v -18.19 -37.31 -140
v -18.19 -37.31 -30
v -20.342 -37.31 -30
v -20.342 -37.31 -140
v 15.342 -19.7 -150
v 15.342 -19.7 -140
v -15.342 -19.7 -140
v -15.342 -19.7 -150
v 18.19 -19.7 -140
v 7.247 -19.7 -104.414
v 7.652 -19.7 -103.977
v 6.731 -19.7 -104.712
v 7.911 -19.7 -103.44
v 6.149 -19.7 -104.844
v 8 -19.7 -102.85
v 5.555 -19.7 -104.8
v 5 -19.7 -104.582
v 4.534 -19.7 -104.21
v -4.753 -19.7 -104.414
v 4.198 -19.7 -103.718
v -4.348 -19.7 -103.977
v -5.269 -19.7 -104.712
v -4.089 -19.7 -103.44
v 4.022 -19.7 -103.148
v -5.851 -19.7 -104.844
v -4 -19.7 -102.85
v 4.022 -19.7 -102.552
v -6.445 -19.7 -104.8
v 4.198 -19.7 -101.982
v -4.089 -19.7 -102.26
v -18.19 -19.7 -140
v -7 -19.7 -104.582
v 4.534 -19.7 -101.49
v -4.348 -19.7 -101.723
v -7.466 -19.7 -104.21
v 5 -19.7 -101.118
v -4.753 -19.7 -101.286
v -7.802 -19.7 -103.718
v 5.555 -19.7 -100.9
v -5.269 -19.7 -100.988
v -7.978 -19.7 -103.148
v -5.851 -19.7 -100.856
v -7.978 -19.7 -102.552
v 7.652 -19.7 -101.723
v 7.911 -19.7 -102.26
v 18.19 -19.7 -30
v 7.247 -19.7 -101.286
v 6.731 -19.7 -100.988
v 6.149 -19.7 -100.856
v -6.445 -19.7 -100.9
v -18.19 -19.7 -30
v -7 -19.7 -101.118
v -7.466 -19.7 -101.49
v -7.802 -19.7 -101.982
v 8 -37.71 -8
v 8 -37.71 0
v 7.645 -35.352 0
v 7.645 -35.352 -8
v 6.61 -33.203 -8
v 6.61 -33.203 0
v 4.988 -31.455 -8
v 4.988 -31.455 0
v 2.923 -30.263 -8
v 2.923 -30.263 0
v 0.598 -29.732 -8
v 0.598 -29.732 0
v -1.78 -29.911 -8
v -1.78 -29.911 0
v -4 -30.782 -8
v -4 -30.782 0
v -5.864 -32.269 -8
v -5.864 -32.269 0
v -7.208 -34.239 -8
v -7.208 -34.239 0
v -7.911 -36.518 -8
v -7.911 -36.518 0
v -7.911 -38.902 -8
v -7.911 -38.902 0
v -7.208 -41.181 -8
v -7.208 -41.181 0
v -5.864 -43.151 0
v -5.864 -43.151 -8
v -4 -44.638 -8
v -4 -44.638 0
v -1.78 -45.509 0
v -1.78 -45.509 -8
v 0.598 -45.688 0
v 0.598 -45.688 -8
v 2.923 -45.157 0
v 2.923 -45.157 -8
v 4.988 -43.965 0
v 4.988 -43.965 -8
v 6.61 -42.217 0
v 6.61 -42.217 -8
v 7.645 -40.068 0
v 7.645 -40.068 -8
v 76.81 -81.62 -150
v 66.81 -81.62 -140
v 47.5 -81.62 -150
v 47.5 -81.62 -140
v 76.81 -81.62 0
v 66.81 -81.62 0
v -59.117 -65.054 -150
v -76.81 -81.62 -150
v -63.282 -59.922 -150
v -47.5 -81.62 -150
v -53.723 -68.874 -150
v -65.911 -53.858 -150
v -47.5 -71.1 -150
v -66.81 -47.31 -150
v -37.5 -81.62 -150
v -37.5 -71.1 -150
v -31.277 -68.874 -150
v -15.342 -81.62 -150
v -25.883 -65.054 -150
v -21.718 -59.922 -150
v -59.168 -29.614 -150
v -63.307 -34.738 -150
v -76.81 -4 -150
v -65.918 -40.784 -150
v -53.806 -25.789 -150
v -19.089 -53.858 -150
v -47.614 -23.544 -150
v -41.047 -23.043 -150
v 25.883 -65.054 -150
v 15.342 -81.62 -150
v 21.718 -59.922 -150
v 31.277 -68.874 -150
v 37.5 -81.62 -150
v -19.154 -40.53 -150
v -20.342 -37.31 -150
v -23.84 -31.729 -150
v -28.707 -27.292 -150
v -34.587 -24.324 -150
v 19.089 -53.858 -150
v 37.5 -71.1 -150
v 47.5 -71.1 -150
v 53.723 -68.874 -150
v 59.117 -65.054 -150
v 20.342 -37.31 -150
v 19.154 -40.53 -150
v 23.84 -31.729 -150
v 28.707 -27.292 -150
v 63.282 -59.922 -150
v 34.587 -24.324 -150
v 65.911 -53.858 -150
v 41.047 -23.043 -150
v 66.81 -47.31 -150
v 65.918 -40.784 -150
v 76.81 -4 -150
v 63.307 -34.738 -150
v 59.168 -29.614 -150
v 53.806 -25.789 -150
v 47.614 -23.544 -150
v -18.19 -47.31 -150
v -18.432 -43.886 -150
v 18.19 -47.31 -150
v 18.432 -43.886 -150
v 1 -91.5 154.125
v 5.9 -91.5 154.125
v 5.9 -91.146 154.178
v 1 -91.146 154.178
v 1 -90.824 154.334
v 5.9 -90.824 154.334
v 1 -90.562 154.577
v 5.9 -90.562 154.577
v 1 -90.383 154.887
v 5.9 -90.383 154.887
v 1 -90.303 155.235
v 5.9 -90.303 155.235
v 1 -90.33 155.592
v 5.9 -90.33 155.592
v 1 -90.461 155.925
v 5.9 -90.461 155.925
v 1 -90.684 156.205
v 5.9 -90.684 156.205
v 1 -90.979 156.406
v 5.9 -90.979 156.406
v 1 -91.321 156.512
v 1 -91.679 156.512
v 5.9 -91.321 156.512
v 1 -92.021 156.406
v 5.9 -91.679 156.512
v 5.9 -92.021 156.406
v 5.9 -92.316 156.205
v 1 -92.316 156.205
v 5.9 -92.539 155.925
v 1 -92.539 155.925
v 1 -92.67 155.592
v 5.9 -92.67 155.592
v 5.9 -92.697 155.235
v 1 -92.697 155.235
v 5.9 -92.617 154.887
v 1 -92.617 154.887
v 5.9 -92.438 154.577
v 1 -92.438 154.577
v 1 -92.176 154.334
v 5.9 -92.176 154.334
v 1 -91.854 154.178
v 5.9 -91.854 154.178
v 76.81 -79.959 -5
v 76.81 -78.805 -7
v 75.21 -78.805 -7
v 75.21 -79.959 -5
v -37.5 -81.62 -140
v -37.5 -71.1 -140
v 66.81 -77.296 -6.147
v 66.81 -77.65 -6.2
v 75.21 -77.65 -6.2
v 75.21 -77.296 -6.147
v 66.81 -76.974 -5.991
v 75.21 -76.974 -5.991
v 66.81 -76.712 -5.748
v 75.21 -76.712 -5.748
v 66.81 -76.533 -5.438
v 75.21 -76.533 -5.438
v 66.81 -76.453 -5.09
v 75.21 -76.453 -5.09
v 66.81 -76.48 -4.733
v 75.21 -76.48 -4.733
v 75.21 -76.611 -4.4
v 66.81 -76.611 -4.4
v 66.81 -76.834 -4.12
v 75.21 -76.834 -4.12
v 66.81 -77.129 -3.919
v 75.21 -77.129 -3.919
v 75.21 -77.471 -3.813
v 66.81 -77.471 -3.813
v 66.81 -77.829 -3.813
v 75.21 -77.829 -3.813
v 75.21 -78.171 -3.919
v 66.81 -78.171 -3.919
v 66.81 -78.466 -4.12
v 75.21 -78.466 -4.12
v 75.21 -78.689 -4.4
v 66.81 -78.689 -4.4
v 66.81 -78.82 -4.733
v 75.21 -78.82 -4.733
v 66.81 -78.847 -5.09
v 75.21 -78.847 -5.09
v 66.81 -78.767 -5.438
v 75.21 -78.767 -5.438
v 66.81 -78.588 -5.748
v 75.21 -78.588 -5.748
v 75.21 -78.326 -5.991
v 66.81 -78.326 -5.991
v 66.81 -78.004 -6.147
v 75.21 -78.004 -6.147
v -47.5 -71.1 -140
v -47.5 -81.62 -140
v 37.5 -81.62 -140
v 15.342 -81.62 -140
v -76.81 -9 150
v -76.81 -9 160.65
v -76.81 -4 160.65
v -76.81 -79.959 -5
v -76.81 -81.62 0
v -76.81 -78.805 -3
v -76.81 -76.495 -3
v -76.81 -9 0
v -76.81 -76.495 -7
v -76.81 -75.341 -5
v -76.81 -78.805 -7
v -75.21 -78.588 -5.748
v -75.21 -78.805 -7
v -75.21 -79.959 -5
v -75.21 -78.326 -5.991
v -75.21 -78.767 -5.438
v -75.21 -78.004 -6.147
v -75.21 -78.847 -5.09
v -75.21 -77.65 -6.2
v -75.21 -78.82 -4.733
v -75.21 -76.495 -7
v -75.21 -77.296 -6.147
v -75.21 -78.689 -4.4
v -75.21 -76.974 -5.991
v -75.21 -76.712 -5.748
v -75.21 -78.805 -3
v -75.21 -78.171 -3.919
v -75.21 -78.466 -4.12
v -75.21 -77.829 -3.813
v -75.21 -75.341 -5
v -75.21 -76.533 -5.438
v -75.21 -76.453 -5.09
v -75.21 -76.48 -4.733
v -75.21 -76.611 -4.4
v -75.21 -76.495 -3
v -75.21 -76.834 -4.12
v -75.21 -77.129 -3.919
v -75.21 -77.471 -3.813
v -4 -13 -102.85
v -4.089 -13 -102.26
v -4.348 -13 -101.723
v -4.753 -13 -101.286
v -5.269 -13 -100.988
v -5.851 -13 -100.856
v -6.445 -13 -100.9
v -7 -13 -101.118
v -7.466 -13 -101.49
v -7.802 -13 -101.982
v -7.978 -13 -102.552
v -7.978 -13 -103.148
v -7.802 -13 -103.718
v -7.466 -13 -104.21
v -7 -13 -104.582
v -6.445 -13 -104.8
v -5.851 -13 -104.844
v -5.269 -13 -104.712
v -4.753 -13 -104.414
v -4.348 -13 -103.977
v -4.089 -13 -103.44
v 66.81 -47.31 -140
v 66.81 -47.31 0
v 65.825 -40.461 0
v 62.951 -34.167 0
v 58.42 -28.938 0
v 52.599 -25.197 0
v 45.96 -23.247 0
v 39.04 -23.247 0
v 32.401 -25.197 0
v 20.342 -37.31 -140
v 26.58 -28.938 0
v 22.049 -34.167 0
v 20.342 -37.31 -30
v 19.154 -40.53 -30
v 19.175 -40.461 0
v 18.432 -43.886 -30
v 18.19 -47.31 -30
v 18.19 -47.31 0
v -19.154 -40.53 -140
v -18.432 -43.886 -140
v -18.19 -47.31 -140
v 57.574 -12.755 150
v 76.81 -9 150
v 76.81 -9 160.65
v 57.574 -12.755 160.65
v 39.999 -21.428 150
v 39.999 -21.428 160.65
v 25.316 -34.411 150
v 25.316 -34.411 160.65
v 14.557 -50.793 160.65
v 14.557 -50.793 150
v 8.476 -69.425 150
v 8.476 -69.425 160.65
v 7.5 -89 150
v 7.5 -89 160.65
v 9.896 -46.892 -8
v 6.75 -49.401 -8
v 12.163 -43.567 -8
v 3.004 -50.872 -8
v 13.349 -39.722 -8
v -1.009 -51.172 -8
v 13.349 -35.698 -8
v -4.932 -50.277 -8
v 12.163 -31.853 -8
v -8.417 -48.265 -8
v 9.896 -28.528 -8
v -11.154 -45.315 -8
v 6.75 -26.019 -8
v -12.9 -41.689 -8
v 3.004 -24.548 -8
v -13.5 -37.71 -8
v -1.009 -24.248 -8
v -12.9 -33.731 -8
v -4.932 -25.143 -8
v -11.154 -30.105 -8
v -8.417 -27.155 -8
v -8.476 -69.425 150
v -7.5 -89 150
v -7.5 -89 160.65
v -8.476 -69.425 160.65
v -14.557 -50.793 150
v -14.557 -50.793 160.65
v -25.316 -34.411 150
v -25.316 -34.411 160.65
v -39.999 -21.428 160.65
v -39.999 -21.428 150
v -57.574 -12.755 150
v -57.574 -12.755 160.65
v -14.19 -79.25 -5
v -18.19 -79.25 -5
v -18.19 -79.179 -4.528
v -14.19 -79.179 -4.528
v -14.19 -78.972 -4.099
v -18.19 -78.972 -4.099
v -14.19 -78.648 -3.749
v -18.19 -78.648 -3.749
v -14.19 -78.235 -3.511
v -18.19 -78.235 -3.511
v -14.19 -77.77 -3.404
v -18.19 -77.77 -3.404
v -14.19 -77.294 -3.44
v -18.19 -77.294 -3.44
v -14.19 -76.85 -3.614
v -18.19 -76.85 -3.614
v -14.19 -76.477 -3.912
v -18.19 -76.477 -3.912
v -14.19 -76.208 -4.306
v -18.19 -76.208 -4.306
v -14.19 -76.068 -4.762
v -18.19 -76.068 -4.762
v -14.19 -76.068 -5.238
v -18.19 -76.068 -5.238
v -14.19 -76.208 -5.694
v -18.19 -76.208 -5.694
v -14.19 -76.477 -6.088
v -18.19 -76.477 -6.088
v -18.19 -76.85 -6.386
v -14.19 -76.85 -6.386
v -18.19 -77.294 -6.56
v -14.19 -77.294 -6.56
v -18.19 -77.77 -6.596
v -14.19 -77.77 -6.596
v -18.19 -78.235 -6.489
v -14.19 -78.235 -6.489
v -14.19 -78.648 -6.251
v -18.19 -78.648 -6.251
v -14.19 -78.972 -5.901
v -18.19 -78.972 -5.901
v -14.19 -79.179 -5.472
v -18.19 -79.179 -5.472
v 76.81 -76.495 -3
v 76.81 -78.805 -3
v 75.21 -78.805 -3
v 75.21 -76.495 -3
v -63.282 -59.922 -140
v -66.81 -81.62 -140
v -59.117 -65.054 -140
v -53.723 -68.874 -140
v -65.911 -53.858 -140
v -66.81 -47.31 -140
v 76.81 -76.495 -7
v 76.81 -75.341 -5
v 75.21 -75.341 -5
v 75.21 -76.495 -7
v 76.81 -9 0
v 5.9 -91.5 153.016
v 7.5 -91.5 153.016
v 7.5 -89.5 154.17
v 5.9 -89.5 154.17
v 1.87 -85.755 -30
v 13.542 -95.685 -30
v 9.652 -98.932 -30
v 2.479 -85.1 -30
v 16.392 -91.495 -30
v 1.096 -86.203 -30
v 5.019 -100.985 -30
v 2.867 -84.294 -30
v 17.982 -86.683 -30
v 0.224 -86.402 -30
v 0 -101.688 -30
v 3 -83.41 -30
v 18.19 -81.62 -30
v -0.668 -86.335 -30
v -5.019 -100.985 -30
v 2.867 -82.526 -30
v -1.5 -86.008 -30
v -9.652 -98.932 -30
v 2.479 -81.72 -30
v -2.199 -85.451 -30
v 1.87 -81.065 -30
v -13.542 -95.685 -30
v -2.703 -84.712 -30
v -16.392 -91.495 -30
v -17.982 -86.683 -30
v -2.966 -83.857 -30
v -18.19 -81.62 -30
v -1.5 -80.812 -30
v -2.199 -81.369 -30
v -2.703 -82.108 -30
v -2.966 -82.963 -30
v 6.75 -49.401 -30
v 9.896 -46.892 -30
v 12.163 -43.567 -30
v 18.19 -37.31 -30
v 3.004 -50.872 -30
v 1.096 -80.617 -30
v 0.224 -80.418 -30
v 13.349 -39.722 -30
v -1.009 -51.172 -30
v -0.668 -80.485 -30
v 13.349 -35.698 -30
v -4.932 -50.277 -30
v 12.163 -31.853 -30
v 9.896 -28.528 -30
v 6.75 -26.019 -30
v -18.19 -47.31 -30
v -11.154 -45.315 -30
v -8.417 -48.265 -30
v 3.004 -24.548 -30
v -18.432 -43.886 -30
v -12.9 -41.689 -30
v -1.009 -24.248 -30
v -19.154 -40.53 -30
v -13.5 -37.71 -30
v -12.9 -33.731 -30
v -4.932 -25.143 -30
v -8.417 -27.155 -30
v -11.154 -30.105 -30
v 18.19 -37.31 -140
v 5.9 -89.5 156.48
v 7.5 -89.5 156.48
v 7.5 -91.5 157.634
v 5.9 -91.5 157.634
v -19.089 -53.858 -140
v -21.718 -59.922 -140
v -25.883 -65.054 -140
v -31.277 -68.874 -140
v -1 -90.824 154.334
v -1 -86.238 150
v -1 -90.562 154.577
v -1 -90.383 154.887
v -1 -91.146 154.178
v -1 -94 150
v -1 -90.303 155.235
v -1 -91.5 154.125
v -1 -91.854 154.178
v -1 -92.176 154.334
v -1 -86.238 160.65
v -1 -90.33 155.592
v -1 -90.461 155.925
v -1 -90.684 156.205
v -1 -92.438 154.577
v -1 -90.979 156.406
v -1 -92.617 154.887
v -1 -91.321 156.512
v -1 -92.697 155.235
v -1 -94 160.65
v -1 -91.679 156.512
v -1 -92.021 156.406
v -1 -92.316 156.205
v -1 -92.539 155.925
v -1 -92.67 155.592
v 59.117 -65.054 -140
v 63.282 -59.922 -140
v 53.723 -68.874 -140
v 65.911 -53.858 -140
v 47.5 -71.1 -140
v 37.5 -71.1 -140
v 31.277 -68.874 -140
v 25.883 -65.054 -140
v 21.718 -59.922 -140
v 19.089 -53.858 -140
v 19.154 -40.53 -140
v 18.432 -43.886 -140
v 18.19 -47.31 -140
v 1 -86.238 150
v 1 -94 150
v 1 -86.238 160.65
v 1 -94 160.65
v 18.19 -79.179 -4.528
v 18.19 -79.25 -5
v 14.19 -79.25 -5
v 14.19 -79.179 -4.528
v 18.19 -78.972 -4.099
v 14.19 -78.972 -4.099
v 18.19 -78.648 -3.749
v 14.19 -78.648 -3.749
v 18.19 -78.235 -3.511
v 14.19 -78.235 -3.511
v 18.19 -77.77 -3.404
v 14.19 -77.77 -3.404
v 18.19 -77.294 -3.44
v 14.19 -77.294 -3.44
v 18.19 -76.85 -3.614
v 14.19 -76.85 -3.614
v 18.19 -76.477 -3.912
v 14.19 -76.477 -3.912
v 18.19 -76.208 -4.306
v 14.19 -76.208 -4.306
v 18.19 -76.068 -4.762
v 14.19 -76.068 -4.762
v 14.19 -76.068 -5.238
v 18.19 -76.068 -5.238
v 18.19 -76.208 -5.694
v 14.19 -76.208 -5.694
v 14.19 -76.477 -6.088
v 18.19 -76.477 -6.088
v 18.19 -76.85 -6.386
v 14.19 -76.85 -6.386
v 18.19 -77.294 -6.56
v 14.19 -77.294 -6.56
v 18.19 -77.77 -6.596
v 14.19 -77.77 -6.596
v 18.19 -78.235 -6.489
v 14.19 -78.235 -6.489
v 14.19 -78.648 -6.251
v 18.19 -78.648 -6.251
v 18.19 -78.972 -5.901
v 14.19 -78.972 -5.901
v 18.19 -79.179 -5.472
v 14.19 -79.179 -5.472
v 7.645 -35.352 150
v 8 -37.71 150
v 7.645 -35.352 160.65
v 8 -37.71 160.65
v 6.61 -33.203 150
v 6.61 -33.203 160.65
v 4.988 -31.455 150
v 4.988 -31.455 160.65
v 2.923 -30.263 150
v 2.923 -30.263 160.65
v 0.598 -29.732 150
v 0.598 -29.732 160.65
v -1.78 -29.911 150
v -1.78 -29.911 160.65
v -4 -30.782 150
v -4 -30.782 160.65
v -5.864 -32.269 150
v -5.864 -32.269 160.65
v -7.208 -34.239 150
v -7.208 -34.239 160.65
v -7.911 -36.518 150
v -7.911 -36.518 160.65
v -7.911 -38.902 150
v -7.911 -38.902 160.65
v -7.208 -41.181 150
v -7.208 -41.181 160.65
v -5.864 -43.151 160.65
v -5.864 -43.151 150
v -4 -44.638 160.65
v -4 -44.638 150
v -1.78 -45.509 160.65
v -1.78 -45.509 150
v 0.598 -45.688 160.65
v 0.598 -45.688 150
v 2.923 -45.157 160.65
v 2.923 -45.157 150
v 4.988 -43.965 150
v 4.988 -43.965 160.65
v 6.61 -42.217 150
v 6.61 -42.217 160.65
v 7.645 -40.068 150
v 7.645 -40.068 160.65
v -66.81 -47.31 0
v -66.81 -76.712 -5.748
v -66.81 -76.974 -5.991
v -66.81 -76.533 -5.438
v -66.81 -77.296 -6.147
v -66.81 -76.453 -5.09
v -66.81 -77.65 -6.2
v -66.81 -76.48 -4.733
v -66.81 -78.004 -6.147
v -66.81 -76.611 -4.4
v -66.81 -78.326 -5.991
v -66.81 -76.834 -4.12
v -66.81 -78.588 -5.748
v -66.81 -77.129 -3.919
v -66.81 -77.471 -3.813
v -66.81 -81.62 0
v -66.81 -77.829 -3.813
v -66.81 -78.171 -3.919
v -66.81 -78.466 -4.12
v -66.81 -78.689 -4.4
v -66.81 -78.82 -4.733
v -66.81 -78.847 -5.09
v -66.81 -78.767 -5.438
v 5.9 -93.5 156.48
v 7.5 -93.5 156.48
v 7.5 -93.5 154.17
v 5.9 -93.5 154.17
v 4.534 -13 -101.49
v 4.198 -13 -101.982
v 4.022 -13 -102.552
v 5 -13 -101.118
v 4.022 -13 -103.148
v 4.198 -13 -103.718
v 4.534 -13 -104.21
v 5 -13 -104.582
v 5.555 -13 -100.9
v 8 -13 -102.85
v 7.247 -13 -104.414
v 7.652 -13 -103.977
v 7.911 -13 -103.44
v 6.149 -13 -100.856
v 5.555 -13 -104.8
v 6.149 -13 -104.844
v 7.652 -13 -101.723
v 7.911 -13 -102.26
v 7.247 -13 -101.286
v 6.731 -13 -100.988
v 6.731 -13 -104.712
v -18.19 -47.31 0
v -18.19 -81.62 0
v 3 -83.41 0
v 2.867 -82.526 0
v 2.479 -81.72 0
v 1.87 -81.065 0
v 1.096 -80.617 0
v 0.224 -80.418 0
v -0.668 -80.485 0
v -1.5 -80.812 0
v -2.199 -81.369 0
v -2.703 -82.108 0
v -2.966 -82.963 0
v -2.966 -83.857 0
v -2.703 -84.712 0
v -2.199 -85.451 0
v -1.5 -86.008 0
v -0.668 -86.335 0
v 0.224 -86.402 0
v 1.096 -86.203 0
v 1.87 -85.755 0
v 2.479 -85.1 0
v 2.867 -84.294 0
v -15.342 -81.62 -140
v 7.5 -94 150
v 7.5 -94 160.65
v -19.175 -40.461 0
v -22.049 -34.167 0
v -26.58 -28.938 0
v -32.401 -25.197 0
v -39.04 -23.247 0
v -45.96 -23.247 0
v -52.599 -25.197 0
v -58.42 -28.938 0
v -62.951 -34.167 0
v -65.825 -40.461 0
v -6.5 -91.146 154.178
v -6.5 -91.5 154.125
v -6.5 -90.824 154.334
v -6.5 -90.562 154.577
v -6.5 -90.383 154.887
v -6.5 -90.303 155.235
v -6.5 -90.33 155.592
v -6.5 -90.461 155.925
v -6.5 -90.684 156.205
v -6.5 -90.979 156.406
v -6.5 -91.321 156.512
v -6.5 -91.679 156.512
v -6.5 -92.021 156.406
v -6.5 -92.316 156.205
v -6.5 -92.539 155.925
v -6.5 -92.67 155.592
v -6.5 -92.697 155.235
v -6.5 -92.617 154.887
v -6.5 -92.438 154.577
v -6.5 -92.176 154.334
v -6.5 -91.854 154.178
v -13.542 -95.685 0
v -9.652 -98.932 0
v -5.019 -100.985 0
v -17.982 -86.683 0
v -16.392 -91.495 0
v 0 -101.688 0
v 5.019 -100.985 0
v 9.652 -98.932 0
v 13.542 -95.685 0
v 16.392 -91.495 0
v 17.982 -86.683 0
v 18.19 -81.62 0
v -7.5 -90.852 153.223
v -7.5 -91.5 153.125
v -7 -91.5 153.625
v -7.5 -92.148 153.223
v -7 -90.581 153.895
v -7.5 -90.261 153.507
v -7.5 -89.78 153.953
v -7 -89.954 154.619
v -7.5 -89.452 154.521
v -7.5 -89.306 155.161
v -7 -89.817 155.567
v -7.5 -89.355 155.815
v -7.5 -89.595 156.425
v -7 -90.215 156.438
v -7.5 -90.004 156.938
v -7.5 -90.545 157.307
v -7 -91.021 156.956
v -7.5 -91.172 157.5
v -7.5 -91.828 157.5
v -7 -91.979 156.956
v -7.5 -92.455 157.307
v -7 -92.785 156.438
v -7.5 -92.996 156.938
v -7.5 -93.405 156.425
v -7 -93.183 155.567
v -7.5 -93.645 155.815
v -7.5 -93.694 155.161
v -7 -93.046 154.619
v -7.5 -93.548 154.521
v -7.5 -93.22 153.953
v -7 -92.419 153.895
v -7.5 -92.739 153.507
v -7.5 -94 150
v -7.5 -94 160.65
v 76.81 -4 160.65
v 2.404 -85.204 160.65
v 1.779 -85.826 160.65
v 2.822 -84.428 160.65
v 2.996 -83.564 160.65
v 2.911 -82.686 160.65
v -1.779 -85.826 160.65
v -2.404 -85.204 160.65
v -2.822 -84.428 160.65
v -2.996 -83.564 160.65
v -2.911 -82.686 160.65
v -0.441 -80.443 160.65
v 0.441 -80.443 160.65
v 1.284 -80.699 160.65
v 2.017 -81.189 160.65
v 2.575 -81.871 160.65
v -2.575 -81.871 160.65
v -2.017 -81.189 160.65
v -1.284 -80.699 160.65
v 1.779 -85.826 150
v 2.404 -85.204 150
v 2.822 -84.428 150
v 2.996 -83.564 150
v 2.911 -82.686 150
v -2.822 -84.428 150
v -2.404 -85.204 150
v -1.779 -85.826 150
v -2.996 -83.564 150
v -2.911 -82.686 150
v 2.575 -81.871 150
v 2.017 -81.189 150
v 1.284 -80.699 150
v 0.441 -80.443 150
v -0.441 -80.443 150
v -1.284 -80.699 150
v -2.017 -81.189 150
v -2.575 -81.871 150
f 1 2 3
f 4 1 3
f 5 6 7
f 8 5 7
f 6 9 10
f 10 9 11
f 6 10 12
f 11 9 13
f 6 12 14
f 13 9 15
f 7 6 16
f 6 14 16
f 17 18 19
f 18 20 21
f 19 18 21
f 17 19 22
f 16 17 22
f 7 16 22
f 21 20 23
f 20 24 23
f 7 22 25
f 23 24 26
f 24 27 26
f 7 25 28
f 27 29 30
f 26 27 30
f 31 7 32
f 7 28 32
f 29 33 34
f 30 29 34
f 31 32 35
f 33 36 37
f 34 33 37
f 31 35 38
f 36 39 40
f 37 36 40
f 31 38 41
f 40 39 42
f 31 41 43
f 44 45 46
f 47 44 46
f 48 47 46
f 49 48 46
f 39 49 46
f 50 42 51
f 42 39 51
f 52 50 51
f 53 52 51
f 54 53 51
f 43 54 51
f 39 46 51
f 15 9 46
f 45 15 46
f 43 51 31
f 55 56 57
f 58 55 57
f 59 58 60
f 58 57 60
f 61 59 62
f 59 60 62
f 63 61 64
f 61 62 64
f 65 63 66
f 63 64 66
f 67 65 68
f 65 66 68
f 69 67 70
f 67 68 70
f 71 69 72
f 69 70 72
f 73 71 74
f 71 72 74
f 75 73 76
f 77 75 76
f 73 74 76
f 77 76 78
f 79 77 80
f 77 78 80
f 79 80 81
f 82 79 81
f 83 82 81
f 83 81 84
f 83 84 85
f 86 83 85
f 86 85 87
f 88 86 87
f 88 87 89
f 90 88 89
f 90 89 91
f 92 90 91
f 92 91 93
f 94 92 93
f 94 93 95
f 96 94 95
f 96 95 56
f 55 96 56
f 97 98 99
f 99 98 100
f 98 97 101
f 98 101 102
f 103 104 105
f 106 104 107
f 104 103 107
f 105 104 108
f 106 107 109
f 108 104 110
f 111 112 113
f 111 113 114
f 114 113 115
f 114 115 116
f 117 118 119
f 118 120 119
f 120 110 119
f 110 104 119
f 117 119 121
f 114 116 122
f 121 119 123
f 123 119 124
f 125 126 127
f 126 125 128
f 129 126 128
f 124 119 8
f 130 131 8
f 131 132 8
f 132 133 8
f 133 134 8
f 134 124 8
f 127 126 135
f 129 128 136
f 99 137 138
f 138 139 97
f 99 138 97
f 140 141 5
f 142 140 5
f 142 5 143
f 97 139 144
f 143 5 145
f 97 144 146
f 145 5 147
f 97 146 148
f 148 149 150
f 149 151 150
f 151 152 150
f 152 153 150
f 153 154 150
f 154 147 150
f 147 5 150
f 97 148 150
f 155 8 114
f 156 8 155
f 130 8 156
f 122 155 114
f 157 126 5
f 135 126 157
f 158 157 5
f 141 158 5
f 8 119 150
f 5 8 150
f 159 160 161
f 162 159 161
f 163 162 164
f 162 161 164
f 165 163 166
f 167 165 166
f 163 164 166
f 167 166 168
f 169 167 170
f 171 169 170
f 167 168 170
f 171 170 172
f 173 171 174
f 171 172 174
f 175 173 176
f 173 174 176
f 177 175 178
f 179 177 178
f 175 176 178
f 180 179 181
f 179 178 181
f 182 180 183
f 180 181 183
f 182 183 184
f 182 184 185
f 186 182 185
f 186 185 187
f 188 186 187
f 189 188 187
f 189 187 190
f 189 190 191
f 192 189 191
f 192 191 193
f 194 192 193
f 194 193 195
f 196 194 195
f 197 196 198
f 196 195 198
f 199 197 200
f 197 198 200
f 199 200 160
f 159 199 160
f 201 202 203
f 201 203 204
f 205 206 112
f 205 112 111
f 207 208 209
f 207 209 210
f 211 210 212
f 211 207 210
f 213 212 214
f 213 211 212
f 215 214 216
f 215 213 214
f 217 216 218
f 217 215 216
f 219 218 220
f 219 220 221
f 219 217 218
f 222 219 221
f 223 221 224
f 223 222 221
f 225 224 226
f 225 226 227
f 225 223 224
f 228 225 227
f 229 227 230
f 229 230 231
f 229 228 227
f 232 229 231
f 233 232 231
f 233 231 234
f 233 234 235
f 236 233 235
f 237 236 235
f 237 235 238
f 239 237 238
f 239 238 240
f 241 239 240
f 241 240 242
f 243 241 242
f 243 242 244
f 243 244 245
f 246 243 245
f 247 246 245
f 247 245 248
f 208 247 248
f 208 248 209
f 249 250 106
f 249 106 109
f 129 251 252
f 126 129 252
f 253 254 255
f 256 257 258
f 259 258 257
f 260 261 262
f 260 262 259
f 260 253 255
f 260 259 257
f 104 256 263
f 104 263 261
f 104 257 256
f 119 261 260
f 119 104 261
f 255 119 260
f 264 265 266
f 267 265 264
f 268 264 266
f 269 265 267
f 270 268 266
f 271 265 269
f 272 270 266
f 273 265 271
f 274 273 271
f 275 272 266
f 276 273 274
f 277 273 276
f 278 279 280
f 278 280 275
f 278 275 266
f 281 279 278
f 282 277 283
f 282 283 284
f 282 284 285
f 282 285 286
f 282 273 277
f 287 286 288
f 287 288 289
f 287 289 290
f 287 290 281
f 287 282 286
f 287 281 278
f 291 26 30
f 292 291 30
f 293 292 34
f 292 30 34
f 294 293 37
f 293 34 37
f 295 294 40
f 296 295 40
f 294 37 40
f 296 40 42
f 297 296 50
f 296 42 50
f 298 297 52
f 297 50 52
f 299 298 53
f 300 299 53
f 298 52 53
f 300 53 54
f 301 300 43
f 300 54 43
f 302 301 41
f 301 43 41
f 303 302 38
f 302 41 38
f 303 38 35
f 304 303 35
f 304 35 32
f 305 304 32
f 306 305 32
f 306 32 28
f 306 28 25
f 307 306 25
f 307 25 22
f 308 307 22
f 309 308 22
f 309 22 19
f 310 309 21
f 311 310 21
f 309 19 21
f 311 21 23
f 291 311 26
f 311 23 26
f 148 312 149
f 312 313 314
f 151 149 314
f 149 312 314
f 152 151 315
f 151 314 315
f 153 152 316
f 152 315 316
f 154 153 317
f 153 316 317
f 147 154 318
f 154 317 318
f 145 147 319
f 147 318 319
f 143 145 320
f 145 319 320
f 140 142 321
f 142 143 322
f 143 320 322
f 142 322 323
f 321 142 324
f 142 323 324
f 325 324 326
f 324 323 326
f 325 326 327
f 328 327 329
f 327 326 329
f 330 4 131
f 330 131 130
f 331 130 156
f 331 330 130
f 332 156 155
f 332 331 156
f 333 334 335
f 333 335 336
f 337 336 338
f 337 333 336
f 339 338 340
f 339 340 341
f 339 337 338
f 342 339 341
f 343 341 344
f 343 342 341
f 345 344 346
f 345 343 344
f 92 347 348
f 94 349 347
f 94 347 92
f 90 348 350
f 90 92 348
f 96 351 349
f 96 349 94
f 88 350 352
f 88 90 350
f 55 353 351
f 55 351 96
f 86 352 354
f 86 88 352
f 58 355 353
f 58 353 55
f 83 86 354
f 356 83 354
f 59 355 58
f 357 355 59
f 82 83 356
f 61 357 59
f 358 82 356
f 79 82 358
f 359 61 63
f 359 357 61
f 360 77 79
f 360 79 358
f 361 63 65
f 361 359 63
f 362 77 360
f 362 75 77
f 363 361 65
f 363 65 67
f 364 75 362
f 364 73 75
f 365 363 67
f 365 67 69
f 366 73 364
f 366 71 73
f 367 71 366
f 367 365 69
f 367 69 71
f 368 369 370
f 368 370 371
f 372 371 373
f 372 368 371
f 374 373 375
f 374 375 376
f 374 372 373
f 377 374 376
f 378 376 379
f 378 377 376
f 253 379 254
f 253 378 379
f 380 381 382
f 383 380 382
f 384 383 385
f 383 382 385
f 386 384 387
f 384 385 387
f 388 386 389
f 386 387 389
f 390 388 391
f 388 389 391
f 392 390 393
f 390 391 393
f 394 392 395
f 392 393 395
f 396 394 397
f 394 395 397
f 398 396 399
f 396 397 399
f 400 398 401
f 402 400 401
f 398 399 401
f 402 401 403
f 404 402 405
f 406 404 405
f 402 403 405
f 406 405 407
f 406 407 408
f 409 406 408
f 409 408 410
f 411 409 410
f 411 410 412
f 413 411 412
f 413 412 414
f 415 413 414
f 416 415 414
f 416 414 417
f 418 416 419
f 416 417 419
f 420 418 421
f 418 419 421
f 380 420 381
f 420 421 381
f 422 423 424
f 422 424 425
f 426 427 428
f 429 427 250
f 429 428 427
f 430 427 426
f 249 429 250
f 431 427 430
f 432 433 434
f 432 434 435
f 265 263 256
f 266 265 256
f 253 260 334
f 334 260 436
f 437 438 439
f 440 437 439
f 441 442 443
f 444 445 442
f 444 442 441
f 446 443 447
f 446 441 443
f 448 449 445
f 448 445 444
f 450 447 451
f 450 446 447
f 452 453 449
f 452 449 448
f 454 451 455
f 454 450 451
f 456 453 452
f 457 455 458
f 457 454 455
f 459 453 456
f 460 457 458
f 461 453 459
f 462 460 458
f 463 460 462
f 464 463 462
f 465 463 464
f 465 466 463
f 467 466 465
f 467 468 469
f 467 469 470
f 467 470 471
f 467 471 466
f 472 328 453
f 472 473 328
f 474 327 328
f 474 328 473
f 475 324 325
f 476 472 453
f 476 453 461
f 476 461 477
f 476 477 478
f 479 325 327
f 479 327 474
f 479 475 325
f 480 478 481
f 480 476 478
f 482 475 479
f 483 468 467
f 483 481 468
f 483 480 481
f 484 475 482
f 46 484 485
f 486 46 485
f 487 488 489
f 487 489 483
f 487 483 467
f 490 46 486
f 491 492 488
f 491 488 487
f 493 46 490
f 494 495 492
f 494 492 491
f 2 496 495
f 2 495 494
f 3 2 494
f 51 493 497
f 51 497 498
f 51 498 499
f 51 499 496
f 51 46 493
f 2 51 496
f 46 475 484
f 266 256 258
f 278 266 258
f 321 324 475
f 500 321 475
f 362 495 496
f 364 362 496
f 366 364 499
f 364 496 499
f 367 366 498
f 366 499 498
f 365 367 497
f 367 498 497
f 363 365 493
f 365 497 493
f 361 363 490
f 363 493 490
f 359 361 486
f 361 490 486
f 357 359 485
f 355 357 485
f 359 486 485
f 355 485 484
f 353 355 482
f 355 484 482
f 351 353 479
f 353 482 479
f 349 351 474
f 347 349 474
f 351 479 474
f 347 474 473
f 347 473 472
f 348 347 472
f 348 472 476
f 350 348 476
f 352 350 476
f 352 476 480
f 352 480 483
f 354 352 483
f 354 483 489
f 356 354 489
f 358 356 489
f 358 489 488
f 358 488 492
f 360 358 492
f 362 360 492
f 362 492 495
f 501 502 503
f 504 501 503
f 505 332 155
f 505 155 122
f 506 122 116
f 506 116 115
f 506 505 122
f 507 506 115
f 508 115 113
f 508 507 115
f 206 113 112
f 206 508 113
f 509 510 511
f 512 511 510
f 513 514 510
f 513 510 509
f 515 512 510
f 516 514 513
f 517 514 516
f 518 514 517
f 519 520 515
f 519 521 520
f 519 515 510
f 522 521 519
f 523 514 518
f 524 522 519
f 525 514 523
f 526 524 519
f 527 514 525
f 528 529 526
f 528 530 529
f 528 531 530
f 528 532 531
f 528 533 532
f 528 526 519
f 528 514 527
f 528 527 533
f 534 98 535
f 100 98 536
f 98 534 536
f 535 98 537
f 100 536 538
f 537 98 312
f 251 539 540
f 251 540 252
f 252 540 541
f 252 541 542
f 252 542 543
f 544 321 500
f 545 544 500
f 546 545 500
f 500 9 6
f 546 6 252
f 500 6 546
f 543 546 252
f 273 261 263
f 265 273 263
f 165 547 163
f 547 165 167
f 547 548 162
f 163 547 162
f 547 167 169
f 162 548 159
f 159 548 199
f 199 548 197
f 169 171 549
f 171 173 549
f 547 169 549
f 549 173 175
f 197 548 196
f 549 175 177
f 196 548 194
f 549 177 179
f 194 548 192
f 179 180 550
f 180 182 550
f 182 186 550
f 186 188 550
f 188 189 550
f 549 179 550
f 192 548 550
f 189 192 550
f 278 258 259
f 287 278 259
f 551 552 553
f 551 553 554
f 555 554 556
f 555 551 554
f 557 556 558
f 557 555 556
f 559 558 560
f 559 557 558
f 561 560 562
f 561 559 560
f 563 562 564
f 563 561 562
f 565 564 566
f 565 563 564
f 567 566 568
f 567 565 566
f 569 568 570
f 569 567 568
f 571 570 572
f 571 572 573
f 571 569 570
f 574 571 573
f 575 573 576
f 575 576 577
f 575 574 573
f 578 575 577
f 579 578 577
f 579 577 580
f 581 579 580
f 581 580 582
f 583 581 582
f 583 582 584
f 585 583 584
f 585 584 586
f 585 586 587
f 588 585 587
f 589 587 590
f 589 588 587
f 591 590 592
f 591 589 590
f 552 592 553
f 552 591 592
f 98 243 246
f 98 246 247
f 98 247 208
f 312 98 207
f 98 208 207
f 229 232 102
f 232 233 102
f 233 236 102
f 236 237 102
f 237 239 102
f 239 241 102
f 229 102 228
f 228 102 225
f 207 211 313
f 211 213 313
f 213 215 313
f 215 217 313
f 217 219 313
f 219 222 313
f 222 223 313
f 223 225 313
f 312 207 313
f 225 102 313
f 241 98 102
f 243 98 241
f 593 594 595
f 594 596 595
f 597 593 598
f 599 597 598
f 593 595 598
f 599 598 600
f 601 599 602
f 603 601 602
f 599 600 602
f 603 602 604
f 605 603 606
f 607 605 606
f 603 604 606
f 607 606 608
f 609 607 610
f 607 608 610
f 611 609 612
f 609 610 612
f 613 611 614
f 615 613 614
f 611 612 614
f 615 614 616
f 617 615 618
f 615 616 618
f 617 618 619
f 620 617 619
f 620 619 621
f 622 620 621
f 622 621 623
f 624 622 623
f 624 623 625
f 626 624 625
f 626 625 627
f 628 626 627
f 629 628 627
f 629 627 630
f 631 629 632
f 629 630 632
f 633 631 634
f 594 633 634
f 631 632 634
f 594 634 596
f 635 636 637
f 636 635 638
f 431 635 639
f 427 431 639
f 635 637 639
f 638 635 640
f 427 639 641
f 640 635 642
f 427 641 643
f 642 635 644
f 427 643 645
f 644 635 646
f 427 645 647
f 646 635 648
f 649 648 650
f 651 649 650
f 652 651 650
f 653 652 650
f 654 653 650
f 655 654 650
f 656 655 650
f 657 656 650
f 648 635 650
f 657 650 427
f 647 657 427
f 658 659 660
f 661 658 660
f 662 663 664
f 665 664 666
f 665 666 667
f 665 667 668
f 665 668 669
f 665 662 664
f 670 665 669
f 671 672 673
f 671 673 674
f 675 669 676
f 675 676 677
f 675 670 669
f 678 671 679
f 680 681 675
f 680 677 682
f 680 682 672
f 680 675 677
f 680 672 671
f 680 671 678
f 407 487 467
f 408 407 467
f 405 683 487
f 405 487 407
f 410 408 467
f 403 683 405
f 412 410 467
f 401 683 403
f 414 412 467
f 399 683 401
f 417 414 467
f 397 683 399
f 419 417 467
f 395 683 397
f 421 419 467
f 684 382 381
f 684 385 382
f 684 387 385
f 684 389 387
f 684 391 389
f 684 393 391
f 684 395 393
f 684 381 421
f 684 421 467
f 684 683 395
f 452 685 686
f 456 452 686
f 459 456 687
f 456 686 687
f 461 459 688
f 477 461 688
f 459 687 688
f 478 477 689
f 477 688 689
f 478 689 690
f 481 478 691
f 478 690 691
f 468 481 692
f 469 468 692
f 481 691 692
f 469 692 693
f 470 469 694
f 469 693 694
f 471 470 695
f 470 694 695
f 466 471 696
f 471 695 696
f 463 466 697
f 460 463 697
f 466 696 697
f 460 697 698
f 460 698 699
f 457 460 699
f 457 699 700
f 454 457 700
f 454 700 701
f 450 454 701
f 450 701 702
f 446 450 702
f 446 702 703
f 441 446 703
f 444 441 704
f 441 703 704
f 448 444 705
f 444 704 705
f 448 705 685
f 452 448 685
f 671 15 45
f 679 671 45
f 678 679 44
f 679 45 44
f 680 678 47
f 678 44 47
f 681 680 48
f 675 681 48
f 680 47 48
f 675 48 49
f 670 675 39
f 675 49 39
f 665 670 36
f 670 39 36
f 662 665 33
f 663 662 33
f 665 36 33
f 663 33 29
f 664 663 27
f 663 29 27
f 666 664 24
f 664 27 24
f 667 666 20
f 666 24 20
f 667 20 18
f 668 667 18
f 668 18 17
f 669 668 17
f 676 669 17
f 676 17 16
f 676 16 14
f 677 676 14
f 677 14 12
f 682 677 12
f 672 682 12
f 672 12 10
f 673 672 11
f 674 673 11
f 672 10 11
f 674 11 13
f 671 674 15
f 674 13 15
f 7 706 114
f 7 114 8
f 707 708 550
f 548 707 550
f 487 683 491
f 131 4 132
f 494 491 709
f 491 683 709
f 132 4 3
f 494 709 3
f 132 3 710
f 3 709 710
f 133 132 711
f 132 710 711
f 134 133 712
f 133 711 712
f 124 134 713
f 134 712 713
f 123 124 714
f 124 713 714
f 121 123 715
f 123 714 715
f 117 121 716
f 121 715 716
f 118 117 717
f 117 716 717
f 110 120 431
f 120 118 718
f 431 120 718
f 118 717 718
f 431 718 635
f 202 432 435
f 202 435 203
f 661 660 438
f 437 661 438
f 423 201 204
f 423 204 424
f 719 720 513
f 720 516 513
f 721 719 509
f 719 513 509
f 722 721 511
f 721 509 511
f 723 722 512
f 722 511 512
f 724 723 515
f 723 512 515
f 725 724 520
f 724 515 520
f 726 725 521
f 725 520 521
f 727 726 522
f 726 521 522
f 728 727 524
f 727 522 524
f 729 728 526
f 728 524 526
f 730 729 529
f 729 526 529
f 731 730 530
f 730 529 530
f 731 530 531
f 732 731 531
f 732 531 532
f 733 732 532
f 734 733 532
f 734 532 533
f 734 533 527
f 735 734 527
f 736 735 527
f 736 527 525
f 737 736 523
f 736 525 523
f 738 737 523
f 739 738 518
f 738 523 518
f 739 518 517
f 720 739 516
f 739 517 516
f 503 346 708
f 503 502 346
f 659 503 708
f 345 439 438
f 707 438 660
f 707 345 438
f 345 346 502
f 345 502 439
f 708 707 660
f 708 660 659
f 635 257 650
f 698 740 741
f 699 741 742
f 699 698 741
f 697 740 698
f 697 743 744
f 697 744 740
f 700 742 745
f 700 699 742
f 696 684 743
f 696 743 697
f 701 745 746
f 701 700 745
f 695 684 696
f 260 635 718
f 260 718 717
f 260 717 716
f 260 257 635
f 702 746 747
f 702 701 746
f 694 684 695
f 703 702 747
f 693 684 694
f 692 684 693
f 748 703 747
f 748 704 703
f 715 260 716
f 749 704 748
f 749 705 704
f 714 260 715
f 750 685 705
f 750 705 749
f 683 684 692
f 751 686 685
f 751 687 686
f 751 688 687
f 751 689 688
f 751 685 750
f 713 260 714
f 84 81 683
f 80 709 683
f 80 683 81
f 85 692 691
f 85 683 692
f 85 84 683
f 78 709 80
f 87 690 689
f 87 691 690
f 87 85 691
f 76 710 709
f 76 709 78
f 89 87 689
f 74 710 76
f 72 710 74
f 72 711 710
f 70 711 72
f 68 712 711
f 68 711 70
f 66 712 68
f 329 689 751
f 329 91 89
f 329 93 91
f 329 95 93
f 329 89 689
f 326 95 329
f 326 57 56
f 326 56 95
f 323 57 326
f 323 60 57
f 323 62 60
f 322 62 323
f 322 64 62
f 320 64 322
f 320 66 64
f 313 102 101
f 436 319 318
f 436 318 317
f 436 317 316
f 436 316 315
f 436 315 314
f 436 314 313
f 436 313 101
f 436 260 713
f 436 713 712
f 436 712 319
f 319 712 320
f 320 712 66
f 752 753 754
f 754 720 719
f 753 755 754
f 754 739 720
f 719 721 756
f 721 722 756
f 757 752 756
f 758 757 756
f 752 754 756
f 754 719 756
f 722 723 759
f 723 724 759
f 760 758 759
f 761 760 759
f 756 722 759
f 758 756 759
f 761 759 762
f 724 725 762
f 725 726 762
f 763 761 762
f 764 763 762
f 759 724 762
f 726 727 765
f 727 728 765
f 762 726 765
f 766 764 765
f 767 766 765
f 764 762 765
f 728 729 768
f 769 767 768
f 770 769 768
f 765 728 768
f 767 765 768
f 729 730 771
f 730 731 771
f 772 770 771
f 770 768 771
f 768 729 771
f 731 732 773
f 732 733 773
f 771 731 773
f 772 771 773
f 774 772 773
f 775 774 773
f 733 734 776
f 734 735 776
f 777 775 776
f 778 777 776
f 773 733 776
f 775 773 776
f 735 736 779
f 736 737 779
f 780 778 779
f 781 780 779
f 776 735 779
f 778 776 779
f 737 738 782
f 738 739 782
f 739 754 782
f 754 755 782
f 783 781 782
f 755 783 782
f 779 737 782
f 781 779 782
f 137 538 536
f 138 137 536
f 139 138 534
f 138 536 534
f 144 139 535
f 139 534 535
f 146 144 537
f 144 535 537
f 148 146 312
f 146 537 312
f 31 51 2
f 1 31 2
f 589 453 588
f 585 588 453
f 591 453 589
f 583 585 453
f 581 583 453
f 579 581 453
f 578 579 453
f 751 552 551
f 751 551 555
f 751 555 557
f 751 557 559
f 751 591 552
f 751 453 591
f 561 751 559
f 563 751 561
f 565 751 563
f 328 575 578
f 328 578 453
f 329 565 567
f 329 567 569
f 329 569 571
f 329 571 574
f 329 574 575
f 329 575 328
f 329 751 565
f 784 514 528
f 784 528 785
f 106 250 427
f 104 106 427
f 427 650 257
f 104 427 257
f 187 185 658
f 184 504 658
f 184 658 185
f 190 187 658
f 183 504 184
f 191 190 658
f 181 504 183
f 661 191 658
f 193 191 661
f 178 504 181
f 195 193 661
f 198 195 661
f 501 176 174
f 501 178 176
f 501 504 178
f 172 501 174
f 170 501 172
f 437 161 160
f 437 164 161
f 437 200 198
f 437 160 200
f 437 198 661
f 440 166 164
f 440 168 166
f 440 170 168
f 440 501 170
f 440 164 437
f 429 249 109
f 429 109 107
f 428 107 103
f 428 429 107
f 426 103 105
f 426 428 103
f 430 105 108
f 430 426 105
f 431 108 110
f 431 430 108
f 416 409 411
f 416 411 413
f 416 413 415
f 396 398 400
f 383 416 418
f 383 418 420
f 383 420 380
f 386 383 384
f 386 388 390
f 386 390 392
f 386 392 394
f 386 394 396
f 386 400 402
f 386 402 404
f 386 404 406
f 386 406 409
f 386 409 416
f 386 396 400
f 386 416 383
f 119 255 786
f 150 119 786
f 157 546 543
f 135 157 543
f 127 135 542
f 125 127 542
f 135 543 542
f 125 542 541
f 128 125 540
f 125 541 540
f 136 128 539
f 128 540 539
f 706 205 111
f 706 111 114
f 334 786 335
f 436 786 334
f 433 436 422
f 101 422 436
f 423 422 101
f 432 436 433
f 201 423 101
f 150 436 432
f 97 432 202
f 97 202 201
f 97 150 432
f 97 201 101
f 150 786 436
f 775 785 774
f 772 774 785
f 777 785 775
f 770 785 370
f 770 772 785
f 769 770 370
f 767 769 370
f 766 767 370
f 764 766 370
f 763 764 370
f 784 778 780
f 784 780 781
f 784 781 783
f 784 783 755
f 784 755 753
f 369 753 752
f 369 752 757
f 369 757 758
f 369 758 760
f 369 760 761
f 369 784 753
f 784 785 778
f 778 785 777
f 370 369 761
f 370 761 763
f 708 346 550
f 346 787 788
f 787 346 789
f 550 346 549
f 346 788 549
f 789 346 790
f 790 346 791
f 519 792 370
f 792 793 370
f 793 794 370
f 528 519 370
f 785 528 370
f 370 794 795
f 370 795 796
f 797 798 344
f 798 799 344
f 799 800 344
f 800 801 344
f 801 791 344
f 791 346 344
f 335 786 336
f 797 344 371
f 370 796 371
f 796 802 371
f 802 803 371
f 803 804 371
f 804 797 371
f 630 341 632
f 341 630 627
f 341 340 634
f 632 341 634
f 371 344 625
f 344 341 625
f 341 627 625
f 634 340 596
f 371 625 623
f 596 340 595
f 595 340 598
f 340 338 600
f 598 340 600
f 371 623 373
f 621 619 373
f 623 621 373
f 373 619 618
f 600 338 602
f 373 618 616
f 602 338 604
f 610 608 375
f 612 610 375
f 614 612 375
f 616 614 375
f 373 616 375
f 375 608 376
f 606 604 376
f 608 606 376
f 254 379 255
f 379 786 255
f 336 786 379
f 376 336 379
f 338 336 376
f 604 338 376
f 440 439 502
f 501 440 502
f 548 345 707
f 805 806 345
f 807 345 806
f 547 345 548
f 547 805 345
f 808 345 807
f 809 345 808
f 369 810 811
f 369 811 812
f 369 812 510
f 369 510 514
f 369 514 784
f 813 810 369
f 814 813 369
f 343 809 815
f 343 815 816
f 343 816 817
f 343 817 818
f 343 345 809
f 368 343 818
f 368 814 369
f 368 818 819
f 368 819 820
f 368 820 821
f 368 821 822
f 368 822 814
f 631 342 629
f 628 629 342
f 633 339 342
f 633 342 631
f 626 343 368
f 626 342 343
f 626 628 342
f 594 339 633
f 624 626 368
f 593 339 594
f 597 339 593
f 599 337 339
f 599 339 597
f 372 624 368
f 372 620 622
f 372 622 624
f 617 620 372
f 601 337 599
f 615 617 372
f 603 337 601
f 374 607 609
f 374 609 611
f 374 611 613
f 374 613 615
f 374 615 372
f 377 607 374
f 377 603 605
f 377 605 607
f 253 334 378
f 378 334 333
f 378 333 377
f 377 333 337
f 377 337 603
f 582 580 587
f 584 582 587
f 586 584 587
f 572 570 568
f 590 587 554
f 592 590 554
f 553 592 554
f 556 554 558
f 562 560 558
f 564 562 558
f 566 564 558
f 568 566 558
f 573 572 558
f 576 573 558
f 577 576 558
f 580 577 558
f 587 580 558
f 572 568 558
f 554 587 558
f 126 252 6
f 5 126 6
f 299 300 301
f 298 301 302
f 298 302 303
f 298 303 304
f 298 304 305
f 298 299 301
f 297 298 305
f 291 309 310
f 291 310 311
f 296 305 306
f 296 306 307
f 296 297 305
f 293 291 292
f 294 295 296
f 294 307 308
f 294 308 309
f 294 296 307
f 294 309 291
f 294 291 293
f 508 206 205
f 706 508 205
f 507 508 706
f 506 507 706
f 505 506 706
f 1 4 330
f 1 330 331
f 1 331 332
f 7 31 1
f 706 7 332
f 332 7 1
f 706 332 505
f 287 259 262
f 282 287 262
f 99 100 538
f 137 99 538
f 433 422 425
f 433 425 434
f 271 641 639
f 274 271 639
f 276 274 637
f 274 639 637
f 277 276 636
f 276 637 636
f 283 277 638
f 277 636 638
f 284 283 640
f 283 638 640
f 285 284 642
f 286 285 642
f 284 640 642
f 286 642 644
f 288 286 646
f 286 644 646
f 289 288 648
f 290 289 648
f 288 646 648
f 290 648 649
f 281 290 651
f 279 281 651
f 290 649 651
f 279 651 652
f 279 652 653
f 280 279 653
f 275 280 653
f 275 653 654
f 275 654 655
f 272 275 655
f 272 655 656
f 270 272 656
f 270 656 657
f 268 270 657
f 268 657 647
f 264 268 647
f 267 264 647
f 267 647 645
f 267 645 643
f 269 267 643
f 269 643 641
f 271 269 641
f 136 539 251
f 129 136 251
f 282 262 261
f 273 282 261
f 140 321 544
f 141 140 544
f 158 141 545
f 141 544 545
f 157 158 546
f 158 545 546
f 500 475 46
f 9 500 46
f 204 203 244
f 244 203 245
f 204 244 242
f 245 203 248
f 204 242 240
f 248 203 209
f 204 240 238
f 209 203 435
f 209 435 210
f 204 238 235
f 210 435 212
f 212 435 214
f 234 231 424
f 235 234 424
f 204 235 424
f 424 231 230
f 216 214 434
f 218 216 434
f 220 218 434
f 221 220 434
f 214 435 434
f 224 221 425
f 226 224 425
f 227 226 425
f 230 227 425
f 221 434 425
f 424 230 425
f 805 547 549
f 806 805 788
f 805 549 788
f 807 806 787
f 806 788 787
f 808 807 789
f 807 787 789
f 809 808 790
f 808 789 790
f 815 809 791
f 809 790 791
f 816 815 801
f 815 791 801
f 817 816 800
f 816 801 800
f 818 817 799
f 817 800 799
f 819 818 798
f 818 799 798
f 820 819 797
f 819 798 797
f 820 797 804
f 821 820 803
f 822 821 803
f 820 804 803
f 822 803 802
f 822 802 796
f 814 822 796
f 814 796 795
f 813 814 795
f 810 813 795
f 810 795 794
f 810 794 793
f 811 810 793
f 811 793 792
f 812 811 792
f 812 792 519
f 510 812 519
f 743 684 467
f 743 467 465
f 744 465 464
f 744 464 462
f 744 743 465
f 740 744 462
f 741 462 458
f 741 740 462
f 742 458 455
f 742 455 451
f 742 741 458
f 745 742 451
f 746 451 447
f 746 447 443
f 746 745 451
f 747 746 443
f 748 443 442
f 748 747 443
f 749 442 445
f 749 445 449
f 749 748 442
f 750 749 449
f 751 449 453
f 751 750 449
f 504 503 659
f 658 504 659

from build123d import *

# Parameters (mm, degrees)
SKETCH1_R                                           = 3
SKETCH1_R_2                                         = 8
BOSS_EXTRUDE1_DEPTH                                 = 30
BOSS_EXTRUDE2_DEPTH                                 = 120
SKETCH5_W                                           = 153.62
SKETCH5_H                                           = 9
SKETCH5_H_2                                         = 6
BOSS_EXTRUDE3_DEPTH                                 = 150
SKETCH6_W                                           = 153.62
SKETCH6_H                                           = 6
BOSS_EXTRUDE4_DEPTH                                 = 150
BOSS_EXTRUDE5_DEPTH                                 = 10.65
CUT_EXTRUDE1_REACH                                  = 337.773
SKETCH8_R                                           = 3
SKETCH8_R_2                                         = 8
SKETCH9_R                                           = 13.5
CUT_EXTRUDE2_DEPTH                                  = 22
SKETCH10_R                                          = 2
CUT_EXTRUDE3_DEPTH                                  = 6.7
SKETCH12_W                                          = 40.684038992
SKETCH12_H                                          = 10
CUT_EXTRUDE5_DEPTH                                  = 120
BOSS_EXTRUDE6_START                                 = -10
BOSS_EXTRUDE6_DEPTH                                 = 10
SKETCH11_W                                          = 153.62
SKETCH11_H                                          = 10
CUT_EXTRUDE4_DEPTH                                  = 336.773166974
CUT_EXTRUDE6_REACH                                  = 201.52
CUT_EXTRUDE6_END_RADIUS                             = 3
SKETCH14_W                                          = 2
SKETCH14_H                                          = 10.65
CSK_FOR_M2_COUNTERSUNK_FLAT_HEAD_SCREW1_D           = 2.4
CSK_FOR_M2_COUNTERSUNK_FLAT_HEAD_SCREW1_DEPTH       = 16.5
CSK_FOR_M2_COUNTERSUNK_FLAT_HEAD_SCREW1_CSINK_D     = 4.4
CSK_FOR_M2_COUNTERSUNK_FLAT_HEAD_SCREW1_CSINK_ANGLE = 90
CSK_FOR_M2_COUNTERSUNK_FLAT_HEAD_SCREW1_TIP         = 0.721032743
CUT_EXTRUDE7_DEPTH                                  = 1.6
SKETCH22_R                                          = 1.6
CUT_EXTRUDE8_DEPTH                                  = 4
CUT_EXTRUDE9_DEPTH                                  = 1.6
CUT_EXTRUDE10_REACH                                 = 240.276
SKETCH24_R                                          = 1.2


with BuildPart() as part:
    # Sketch1 → Boss-Extrude1 (new body)
    with BuildSketch(Plane.XY):
        with BuildLine():
            Line((-18.19, -47.31), (-18.19, -81.62))
            ThreePointArc((-18.19, -81.62), (0, -101.687860925), (18.19, -81.62))
            Line((18.19, -81.62), (18.19, -47.31))
            ThreePointArc((18.19, -47.31), (42.5, -23), (66.81, -47.31))
            Line((66.81, -47.31), (66.81, -81.62))
            Line((66.81, -81.62), (76.81, -81.62))
            Line((76.81, -81.62), (76.81, 0))
            Line((76.81, 0), (-76.81, 0))
            Line((-76.81, 0), (-76.81, -81.62))
            Line((-76.81, -81.62), (-66.81, -81.62))
            Line((-66.81, -81.62), (-66.81, -47.31))
            ThreePointArc((-66.81, -47.31), (-42.5, -23), (-18.19, -47.31))
        make_face()
        with Locations((0, -83.41)):
            Circle(SKETCH1_R, mode=Mode.SUBTRACT)
        with Locations((0, -37.71)):
            Circle(SKETCH1_R_2, mode=Mode.SUBTRACT)
    extrude(amount=-BOSS_EXTRUDE1_DEPTH)

    # Sketch3 → Boss-Extrude2 (add)
    with BuildSketch(Plane(origin=(0, 0, -30), x_dir=(-1, 0, 0), z_dir=(0, 0, -1))):
        with BuildLine():
            Line((-76.81, 0), (-76.81, -81.62))
            Line((-76.81, -81.62), (-66.81, -81.62))
            Line((-66.81, -81.62), (-66.81, -47.31))
            ThreePointArc((-66.81, -47.31), (-42.5, -23), (-18.19, -47.31))
            Line((-18.19, -47.31), (-18.19, -19.7))
            Line((-18.19, -19.7), (18.19, -19.7))
            Line((18.19, -19.7), (18.19, -47.31))
            ThreePointArc((18.19, -47.31), (42.5, -23), (66.81, -47.31))
            Line((66.81, -47.31), (66.81, -81.62))
            Line((66.81, -81.62), (76.81, -81.62))
            Line((76.81, -81.62), (76.81, 0))
            Line((76.81, 0), (-76.81, 0))
        make_face()
    extrude(amount=BOSS_EXTRUDE2_DEPTH)

    # Sketch5 → Boss-Extrude3 (add)
    with BuildSketch(Plane.XY):
        with Locations((0, -4.5)):
            Rectangle(SKETCH5_W, SKETCH5_H)
        with Locations((0, 3)):
            Rectangle(SKETCH5_W, SKETCH5_H_2)
    extrude(amount=BOSS_EXTRUDE3_DEPTH)

    # Sketch6 → Boss-Extrude4 (add)
    with BuildSketch(Plane(origin=(0, 0, 0), x_dir=(-1, 0, 0), z_dir=(0, 0, -1))):
        with Locations((0, 3)):
            Rectangle(SKETCH6_W, SKETCH6_H)
    extrude(amount=BOSS_EXTRUDE4_DEPTH)

    # Sketch7 → Boss-Extrude5 (add)
    with BuildSketch(Plane.XY.offset(150)):
        with BuildLine():
            Line((-76.81, -9), (-76.81, 6))
            Line((-76.81, 6), (76.81, 6))
            Line((76.81, 6), (76.81, -9))
            ThreePointArc((76.81, -9), (25.316346961, -34.411411974), (7.5, -89))
            Line((7.5, -89), (7.5, -94))
            Line((7.5, -94), (-7.5, -94))
            Line((-7.5, -94), (-7.5, -89))
            ThreePointArc((-7.5, -89), (-25.316346961, -34.411411974), (-76.81, -9))
        make_face()
    extrude(amount=BOSS_EXTRUDE5_DEPTH)

    # Sketch8 → Cut-Extrude1 (cut, up to next)
    with BuildSketch(Plane.XY.offset(160.65), mode=Mode.PRIVATE) as cut_extrude1_sk1:
        with Locations((0, -83.41)):
            Circle(SKETCH8_R)
    cut_extrude1_tool1 = extrude(cut_extrude1_sk1.sketch, amount=-CUT_EXTRUDE1_REACH, mode=Mode.PRIVATE) & part.part
    # Sketch8 → Cut-Extrude1 (cut, up to next)
    with BuildSketch(Plane.XY.offset(160.65), mode=Mode.PRIVATE) as cut_extrude1_sk2:
        with Locations((0, -37.71)):
            Circle(SKETCH8_R_2)
    cut_extrude1_tool2 = extrude(cut_extrude1_sk2.sketch, amount=-CUT_EXTRUDE1_REACH, mode=Mode.PRIVATE) & part.part
    add(cut_extrude1_tool1.solids().sort_by_distance((0, -83.41, 160.65))[0], mode=Mode.SUBTRACT)
    add(cut_extrude1_tool2.solids().sort_by_distance((0, -37.71, 160.65))[0], mode=Mode.SUBTRACT)

    # Sketch9 → Cut-Extrude2 (cut)
    with BuildSketch(Plane(origin=(0, 0, -30), x_dir=(-1, 0, 0), z_dir=(0, 0, -1))):
        with Locations((0, -37.71)):
            Circle(SKETCH9_R)
    extrude(amount=-CUT_EXTRUDE2_DEPTH, mode=Mode.SUBTRACT)

    # Sketch10 → Cut-Extrude3 (cut)
    with BuildSketch(Plane.XZ.offset(19.7)):
        with Locations((-6, -102.85)):
            Circle(SKETCH10_R)
        with Locations((6, -102.85)):
            Circle(SKETCH10_R)
    extrude(amount=-CUT_EXTRUDE3_DEPTH, mode=Mode.SUBTRACT)

    # Sketch12 → Cut-Extrude5 (cut)
    with BuildSketch(Plane(origin=(0, 0, -150), x_dir=(-1, 0, 0), z_dir=(0, 0, -1))):
        with Locations((0, -42.31)):
            Rectangle(SKETCH12_W, SKETCH12_H)
    extrude(amount=-CUT_EXTRUDE5_DEPTH, mode=Mode.SUBTRACT)

    # Sketch13 → Boss-Extrude6 (add)
    with BuildSketch(Plane(origin=(0, 0, -150), x_dir=(-1, 0, 0), z_dir=(0, 0, -1)).offset(BOSS_EXTRUDE6_START)):
        with BuildLine():
            Line((-18.19, -37.31), (-20.342019496, -37.31))
            ThreePointArc((-20.342019496, -37.31), (-18.734093684, -42.195530626), (-18.19, -47.31))
            ThreePointArc((-18.19, -47.31), (-23.625068212, -62.630347581), (-37.5, -71.100252205))
            Line((-37.5, -71.100252205), (-37.5, -81.62))
            Line((-37.5, -81.62), (-15.342019496, -81.62))
            Line((-15.342019496, -81.62), (-15.342019496, -37.31))
            Line((-15.342019496, -37.31), (-15.342019496, -19.7))
            Line((-15.342019496, -19.7), (-18.19, -19.7))
            Line((-18.19, -19.7), (-18.19, -37.31))
        make_face()
        with BuildLine():
            ThreePointArc((-47.5, -71.100252205), (-61.374931788, -62.630347581), (-66.81, -47.31))
            Line((-66.81, -47.31), (-66.81, -81.62))
            Line((-66.81, -81.62), (-47.5, -81.62))
            Line((-47.5, -81.62), (-47.5, -71.100252205))
        make_face()
    boss_extrude6 = extrude(amount=BOSS_EXTRUDE6_DEPTH)

    # Sketch11 → Cut-Extrude4 (cut, through all)
    with BuildSketch(Plane.XY.offset(160.65)):
        with Locations((0, 1)):
            Rectangle(SKETCH11_W, SKETCH11_H)
    extrude(amount=-CUT_EXTRUDE4_DEPTH, mode=Mode.SUBTRACT)

    # Mirror1: Boss-Extrude6 across plane
    add(boss_extrude6.mirror(Plane(origin=(0, 0, 0), x_dir=(0, 0, 1), z_dir=(1, 0, 0))))

    # Cut-Extrude6: up to this cylinder (the profile starts outside it)
    cut_extrude6_end = Plane(origin=(0, -83.41, 155.325), z_dir=(0, 0, 1)) * Cylinder(CUT_EXTRUDE6_END_RADIUS, 410.04, mode=Mode.PRIVATE)
    # Sketch14 → Cut-Extrude6 (cut, up to the surface)
    with BuildSketch(Plane.XZ.offset(94), mode=Mode.PRIVATE) as cut_extrude6_sk1:
        with Locations((0, 155.325)):
            Rectangle(SKETCH14_W, SKETCH14_H)
    cut_extrude6_tool1 = extrude(cut_extrude6_sk1.sketch, amount=-CUT_EXTRUDE6_REACH, mode=Mode.PRIVATE) - cut_extrude6_end
    add(cut_extrude6_tool1.solids().sort_by_distance((0, -94, 155.325))[0], mode=Mode.SUBTRACT)

    # CSK for M2 Countersunk Flat Head Screw1
    with Locations(Plane.ZY.offset(7.5)):
        with Locations((155.325, -91.5)):
            CounterSinkHole(CSK_FOR_M2_COUNTERSUNK_FLAT_HEAD_SCREW1_D / 2, CSK_FOR_M2_COUNTERSUNK_FLAT_HEAD_SCREW1_CSINK_D / 2, depth=CSK_FOR_M2_COUNTERSUNK_FLAT_HEAD_SCREW1_DEPTH, counter_sink_angle=CSK_FOR_M2_COUNTERSUNK_FLAT_HEAD_SCREW1_CSINK_ANGLE)
            with Locations((0, 0, -(CSK_FOR_M2_COUNTERSUNK_FLAT_HEAD_SCREW1_DEPTH + CSK_FOR_M2_COUNTERSUNK_FLAT_HEAD_SCREW1_TIP / 2))):  # 118° drill point
                Cone(0, CSK_FOR_M2_COUNTERSUNK_FLAT_HEAD_SCREW1_D / 2, CSK_FOR_M2_COUNTERSUNK_FLAT_HEAD_SCREW1_TIP, mode=Mode.SUBTRACT)

    # Sketch19 → Cut-Extrude7 (cut)
    with BuildSketch(Plane(origin=(7.5, 0, 0), x_dir=(0, 0, -1), z_dir=(1, 0, 0))):
        Polygon((-154.170299462, -93.5), (-153.015598923, -91.5), (-154.170299462, -89.5), (-156.479700538, -89.5), (-157.634401077, -91.5), (-156.479700538, -93.5), align=None)
    extrude(amount=-CUT_EXTRUDE7_DEPTH, mode=Mode.SUBTRACT)

    # Sketch22 → Cut-Extrude8 (cut)
    with BuildSketch(Plane.ZY.offset(18.19)):
        with Locations(Location((-5, -77.65, 0), (0, 0, 270))):
            Circle(SKETCH22_R)
    cut_extrude8 = extrude(amount=-CUT_EXTRUDE8_DEPTH, mode=Mode.SUBTRACT)

    # Mirror2: Cut-Extrude8 across plane
    add(cut_extrude8.mirror(Plane(origin=(0, 0, 0), x_dir=(0, 0, 1), z_dir=(1, 0, 0))), mode=Mode.SUBTRACT)

    # Sketch23 → Cut-Extrude9 (cut)
    with BuildSketch(Plane.ZY.offset(76.81)):
        Polygon((-5, -75.340598923), (-7, -76.495299462), (-7, -78.804700538), (-5, -79.959401077), (-3, -78.804700538), (-3, -76.495299462), align=None)
    cut_extrude9 = extrude(amount=-CUT_EXTRUDE9_DEPTH, mode=Mode.SUBTRACT)

    # Mirror3: Cut-Extrude9 across plane
    add(cut_extrude9.mirror(Plane(origin=(0, 0, 0), x_dir=(0, 0, 1), z_dir=(1, 0, 0))), mode=Mode.SUBTRACT)

    # Sketch24 → Cut-Extrude10 (cut, up to next)
    with BuildSketch(Plane(origin=(-66.81, 0, 0), x_dir=(0, 0, -1), z_dir=(1, 0, 0)), mode=Mode.PRIVATE) as cut_extrude10_sk1:
        with Locations((5, -77.65)):
            Circle(SKETCH24_R)
    cut_extrude10_tool1 = extrude(cut_extrude10_sk1.sketch, amount=-CUT_EXTRUDE10_REACH, mode=Mode.PRIVATE) & part.part
    cut_extrude10 = cut_extrude10_tool1.solids().sort_by_distance((-66.81, -77.65, -5))[0]
    add(cut_extrude10, mode=Mode.SUBTRACT)

    # Mirror4: Cut-Extrude10 across plane
    add(cut_extrude10.mirror(Plane(origin=(0, 0, 0), x_dir=(0, 0, 1), z_dir=(1, 0, 0))), mode=Mode.SUBTRACT)


solid = part.part
